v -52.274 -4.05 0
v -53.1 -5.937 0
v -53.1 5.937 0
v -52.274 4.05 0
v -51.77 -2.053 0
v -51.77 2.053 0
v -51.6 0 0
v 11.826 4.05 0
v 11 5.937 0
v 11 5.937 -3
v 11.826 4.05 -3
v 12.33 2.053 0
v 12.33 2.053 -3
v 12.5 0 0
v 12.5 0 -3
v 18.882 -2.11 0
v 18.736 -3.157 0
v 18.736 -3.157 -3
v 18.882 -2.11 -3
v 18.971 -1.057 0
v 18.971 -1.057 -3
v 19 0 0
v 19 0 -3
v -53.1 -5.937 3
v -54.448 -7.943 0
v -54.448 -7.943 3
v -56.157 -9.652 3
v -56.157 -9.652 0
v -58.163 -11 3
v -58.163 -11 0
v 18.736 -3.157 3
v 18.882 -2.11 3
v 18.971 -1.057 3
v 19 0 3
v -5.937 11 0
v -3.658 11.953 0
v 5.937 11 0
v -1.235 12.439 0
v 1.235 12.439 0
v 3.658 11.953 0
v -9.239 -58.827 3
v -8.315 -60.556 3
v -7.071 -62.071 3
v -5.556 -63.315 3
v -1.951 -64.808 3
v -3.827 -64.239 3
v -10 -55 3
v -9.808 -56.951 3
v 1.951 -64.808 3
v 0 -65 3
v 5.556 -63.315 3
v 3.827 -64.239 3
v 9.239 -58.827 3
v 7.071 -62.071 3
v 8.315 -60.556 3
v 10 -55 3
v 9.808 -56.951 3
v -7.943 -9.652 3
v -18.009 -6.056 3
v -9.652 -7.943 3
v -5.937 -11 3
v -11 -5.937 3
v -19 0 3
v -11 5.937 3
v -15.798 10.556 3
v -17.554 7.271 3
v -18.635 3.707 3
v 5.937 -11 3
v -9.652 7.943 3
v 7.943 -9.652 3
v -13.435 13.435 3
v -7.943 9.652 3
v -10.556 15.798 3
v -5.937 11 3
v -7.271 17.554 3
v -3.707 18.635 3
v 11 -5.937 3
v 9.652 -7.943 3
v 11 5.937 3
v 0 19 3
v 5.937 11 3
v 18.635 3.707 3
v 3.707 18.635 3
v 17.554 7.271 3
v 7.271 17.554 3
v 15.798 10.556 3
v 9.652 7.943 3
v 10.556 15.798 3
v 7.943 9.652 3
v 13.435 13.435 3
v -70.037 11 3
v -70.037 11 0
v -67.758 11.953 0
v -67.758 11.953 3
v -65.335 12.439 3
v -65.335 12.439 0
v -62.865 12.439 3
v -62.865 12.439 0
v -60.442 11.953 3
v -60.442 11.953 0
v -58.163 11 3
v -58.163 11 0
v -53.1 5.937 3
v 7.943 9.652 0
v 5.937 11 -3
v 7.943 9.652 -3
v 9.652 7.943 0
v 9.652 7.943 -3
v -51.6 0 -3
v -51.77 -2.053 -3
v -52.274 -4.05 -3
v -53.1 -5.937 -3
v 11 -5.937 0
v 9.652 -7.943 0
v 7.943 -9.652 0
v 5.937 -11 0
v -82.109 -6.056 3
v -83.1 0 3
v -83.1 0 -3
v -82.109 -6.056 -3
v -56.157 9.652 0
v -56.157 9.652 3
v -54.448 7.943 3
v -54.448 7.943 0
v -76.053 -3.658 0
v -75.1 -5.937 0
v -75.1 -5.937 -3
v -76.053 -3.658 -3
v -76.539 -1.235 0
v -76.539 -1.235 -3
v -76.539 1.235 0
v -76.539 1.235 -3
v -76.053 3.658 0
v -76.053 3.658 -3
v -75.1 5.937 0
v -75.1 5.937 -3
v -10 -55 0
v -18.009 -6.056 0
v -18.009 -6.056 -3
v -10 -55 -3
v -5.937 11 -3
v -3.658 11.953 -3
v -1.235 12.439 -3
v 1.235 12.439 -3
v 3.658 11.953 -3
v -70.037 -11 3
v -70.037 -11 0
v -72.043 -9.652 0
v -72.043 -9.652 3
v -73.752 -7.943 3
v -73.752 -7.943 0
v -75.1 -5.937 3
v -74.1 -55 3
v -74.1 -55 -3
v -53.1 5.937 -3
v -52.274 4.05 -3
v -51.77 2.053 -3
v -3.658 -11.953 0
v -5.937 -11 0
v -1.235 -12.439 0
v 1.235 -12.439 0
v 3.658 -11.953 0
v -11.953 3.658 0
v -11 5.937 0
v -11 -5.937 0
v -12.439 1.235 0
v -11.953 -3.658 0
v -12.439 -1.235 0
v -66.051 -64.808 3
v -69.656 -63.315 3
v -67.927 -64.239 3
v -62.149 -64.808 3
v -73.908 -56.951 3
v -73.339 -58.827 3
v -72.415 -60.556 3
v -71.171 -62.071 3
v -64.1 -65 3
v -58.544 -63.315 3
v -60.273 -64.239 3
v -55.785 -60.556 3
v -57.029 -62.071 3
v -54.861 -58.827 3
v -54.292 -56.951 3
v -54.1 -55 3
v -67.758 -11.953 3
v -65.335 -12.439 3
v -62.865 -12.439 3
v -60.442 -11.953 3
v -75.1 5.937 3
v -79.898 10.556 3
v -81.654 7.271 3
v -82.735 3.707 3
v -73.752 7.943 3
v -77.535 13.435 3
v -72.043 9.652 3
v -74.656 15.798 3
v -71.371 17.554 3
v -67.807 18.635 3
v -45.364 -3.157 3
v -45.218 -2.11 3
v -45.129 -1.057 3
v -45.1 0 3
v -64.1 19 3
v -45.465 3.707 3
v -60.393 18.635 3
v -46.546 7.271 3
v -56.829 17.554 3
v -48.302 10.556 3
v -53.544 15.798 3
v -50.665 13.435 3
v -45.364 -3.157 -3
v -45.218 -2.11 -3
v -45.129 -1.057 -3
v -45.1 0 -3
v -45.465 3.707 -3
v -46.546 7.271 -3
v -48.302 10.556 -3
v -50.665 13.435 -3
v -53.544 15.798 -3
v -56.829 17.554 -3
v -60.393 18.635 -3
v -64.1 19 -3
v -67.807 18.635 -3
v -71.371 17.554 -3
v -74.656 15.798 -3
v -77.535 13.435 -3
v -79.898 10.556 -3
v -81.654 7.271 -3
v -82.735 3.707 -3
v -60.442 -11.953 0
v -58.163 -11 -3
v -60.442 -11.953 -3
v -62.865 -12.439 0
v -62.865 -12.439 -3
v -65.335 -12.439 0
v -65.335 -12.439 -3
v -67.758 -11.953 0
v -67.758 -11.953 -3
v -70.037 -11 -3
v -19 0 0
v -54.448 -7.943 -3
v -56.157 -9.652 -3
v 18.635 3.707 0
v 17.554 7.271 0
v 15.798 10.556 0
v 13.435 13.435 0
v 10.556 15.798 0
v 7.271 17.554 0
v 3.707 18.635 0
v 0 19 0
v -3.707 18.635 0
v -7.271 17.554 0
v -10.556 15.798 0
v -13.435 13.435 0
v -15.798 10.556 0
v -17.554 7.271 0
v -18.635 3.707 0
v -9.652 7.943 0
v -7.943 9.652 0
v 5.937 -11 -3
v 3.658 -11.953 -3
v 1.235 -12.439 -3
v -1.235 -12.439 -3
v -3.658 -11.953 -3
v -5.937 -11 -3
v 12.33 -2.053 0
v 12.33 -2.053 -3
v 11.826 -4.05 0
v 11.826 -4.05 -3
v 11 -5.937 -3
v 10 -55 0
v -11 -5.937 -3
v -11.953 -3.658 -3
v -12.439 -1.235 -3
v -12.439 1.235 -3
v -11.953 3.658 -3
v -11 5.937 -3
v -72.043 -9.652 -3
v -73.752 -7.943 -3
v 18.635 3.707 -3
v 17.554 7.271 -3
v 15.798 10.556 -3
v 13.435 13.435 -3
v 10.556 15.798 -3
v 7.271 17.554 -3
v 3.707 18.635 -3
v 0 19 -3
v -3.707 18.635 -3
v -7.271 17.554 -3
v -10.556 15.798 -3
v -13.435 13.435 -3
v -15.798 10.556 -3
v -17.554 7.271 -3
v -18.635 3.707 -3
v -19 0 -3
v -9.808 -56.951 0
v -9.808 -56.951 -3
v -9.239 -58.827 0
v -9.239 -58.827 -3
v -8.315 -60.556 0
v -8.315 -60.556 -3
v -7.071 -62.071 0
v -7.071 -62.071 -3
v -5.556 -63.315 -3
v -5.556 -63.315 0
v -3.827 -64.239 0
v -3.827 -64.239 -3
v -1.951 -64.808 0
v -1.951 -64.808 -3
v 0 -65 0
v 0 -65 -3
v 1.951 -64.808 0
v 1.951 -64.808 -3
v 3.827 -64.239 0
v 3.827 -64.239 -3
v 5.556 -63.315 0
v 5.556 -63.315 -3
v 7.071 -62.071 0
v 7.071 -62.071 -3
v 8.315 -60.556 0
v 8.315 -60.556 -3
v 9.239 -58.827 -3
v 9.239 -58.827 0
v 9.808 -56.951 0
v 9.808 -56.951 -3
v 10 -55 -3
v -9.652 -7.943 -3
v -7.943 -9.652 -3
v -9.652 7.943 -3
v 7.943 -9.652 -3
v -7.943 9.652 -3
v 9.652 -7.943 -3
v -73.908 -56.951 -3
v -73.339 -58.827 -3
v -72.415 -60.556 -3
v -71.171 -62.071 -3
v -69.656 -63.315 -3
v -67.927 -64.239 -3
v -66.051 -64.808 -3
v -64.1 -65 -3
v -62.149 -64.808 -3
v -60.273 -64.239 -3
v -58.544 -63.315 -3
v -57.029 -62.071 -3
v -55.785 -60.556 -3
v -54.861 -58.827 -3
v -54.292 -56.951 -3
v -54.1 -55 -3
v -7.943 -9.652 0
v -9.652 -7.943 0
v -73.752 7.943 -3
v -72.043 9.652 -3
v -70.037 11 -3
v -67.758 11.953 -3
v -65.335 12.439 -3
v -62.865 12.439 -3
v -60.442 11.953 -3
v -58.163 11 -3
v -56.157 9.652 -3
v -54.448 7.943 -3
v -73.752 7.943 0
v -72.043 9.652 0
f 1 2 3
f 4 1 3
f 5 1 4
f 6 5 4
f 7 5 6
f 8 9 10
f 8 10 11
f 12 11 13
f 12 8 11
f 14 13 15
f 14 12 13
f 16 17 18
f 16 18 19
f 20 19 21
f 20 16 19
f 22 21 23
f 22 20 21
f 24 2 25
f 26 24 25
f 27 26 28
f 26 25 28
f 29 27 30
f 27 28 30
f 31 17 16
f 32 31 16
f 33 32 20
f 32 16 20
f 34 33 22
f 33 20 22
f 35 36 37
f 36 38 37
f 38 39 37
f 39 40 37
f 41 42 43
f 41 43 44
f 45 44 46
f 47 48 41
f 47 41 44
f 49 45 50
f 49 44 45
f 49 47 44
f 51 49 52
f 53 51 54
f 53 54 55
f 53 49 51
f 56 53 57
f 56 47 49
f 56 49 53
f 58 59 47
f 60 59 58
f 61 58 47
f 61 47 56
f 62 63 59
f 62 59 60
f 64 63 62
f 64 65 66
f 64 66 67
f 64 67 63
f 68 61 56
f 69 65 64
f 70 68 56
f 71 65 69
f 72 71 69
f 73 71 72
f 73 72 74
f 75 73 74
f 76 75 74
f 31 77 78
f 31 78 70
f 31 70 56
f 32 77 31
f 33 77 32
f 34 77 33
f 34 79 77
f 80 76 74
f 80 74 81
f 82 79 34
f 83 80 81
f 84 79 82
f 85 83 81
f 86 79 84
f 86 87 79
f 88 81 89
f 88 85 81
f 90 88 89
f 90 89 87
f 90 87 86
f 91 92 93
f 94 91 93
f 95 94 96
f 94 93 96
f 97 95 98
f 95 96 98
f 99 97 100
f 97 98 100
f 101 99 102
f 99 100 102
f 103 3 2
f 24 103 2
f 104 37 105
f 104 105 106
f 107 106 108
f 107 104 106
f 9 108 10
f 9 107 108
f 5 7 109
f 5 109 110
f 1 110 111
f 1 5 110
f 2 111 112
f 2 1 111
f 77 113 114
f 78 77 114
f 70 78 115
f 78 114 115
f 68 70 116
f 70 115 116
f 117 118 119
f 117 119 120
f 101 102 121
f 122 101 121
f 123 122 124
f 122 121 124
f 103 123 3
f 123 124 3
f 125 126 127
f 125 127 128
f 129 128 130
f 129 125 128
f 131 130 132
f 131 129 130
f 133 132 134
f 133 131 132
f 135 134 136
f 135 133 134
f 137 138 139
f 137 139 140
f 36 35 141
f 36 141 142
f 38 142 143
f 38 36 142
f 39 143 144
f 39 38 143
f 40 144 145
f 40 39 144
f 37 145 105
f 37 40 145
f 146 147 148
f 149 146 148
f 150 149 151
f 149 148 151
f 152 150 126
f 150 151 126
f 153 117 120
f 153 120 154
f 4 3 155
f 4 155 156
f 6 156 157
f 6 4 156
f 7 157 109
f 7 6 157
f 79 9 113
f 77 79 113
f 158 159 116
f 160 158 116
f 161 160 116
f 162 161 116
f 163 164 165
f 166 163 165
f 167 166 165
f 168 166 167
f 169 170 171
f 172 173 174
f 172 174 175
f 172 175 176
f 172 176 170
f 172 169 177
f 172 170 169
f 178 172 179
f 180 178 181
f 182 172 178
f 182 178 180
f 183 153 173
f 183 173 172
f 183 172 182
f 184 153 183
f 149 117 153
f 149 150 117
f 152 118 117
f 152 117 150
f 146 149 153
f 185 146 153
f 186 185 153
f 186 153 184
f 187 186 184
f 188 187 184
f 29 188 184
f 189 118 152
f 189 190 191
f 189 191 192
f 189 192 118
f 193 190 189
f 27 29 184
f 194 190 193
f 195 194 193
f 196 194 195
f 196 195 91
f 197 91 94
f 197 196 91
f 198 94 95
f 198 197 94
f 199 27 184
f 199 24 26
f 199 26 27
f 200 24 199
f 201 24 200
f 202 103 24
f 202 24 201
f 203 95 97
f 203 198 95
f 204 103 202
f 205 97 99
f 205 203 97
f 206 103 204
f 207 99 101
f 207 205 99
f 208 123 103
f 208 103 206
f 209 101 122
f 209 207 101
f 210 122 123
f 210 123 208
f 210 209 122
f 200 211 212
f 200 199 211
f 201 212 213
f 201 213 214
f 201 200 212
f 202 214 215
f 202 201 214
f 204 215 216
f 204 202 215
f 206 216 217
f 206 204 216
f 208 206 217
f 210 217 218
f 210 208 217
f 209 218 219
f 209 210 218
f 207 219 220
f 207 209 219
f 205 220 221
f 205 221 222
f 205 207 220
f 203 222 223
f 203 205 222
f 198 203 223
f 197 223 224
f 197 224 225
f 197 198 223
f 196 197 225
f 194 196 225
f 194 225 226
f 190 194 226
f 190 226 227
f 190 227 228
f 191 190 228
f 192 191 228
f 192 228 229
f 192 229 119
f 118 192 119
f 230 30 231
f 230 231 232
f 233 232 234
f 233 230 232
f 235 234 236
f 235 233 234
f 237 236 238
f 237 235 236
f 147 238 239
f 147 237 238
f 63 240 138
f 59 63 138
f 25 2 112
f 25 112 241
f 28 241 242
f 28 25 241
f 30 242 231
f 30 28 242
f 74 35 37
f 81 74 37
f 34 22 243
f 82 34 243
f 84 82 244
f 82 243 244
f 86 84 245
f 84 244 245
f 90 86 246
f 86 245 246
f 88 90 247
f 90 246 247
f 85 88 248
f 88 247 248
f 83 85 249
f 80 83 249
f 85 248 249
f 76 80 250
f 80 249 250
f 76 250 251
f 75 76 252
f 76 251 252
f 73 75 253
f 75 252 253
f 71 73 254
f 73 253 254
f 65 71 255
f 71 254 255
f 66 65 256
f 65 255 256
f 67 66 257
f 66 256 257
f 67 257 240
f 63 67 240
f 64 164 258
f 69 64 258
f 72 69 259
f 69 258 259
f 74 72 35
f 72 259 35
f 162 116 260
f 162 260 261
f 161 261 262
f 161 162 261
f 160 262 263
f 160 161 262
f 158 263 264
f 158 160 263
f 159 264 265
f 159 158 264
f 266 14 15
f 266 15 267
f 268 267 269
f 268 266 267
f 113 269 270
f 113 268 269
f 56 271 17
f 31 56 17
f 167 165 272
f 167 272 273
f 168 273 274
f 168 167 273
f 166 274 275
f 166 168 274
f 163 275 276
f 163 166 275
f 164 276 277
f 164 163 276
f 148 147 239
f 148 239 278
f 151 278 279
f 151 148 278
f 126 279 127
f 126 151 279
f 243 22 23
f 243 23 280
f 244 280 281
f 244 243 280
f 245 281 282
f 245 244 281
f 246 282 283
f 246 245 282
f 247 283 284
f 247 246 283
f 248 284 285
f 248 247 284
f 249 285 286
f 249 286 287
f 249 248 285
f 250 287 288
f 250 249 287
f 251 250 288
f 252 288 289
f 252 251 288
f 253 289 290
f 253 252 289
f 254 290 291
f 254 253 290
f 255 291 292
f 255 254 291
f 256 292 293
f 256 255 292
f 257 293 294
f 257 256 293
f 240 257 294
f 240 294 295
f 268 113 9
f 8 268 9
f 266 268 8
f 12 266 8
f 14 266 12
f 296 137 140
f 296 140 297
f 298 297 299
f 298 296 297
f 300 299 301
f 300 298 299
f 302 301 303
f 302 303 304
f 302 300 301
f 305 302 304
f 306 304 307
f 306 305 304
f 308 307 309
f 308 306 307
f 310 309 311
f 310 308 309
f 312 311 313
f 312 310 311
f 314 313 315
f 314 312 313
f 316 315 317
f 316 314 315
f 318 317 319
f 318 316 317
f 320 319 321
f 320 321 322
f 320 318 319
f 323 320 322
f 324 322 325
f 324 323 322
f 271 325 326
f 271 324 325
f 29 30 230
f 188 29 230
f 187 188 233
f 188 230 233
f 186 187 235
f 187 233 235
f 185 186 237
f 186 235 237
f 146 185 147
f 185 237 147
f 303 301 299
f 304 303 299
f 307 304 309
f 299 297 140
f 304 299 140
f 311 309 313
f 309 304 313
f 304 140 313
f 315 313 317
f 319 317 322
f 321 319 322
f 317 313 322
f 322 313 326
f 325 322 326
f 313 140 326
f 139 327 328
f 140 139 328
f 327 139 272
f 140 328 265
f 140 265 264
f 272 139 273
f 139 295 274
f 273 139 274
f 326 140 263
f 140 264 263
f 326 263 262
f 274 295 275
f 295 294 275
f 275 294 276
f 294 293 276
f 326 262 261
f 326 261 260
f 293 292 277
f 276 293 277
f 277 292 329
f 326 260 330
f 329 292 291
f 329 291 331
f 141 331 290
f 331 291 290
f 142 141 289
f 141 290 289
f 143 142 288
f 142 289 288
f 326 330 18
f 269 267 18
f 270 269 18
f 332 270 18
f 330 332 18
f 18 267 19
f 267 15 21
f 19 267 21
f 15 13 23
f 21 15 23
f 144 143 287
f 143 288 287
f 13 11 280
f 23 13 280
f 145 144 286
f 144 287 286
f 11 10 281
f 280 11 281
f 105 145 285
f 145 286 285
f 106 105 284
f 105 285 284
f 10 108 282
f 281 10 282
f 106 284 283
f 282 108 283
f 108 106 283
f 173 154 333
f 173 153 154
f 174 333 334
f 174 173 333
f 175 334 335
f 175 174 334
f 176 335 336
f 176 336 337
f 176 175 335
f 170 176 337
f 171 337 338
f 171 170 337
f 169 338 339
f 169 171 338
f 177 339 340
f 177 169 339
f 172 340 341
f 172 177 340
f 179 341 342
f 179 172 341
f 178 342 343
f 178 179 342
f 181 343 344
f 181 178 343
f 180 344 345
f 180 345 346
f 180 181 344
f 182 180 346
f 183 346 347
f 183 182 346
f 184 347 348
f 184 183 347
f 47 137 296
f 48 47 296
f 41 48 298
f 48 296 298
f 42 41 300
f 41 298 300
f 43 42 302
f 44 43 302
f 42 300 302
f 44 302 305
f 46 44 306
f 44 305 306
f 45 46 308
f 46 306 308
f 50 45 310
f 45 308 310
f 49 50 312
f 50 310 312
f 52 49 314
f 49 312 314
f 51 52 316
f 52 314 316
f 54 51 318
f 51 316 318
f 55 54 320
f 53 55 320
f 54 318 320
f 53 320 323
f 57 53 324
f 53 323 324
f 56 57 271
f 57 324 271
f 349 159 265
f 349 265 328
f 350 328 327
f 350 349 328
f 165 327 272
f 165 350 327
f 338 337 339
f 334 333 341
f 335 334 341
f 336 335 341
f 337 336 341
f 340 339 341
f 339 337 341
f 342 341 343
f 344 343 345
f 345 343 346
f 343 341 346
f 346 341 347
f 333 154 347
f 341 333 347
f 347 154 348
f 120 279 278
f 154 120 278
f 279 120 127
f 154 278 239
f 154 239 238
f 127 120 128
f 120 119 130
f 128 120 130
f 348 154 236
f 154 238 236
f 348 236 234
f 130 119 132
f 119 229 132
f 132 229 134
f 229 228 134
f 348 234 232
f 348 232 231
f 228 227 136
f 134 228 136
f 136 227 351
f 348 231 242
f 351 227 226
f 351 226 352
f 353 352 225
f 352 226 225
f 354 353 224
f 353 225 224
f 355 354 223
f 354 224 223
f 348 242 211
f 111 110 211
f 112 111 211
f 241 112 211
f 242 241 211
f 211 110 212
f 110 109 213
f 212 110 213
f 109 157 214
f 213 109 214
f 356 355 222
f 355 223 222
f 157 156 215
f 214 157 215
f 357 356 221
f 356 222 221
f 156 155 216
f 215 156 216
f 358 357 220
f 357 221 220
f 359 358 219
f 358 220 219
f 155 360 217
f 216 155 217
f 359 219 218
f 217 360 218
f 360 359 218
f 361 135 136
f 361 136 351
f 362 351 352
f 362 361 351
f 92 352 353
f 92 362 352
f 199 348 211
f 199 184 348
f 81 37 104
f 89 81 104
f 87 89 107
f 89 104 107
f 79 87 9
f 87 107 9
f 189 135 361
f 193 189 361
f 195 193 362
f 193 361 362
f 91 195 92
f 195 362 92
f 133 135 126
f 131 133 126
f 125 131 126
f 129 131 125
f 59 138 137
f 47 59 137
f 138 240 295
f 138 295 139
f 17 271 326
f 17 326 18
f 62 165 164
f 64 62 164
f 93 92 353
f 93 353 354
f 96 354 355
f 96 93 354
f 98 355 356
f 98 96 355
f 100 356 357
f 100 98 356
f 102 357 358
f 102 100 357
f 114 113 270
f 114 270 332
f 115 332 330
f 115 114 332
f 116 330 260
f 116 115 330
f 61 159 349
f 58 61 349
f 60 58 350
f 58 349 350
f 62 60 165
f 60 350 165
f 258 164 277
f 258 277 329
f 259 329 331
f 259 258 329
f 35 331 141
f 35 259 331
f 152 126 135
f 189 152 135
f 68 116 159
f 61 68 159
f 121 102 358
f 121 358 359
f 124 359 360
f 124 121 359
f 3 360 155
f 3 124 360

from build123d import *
from build123d import SkipClean  # not in build123d's __all__

# Parameters (mm, degrees)
F1_DEPTH = 3
F2_DEPTH = 3
F4_DEPTH = 25
F6_DEPTH = 25


with BuildPart() as f1:
    # F0 (on Top) → F1 (new body)
    with BuildSketch(Plane.XY):
        with BuildLine():
            ThreePointArc((18.7358645414, -3.1571157542), (18.9338509856, -1.5840728697), (19, 0))
            ThreePointArc((19, 0), (0, 19), (-19, 0))
            Line((-19, 0), (-18.00901481, -6.0560206053))
            ThreePointArc((-18.00901481, -6.0560206053), (1.4943192319, -18.9411459535), (18.7358645414, -3.1571157542))
        make_face()
        with BuildLine():
            Line((-11, 5.9371710435), (-11, 11))
            Line((-11, 11), (-5.9371710435, 11))
            ThreePointArc((-5.9371710435, 11), (0, 12.5), (5.9371710435, 11))
            Line((5.9371710435, 11), (11, 11))
            Line((11, 11), (11, 5.9371710435))
            ThreePointArc((11, 5.9371710435), (12.1191996435, 3.0618621785), (12.5, 0))
            ThreePointArc((12.5, 0), (12.1191996435, -3.0618621785), (11, -5.9371710435))
            Line((11, -5.9371710435), (11, -11))
            Line((11, -11), (5.9371710435, -11))
            ThreePointArc((5.9371710435, -11), (0, -12.5), (-5.9371710435, -11))
            Line((-5.9371710435, -11), (-11, -11))
            Line((-11, -11), (-11, -5.9371710435))
            ThreePointArc((-11, -5.9371710435), (-12.5, 0), (-11, 5.9371710435))
        make_face(mode=Mode.SUBTRACT)
        with BuildLine():
            Line((-18.00901481, -6.0560206053), (-19, 0))
            ThreePointArc((-19, 0), (-18.7506170751, -3.0682827941), (-18.00901481, -6.0560206053))
        make_face()
        with BuildLine():
            Line((10, -55), (18.7358645414, -3.1571157542))
            ThreePointArc((18.7358645414, -3.1571157542), (1.4943192319, -18.9411459535), (-18.00901481, -6.0560206053))
            Line((-18.00901481, -6.0560206053), (-10, -55))
            ThreePointArc((-10, -55), (0, -45), (10, -55))
        make_face()
        with BuildLine():
            ThreePointArc((-10, -55), (0, -65), (10, -55))
            ThreePointArc((10, -55), (0, -45), (-10, -55))
        make_face()
        with BuildLine():
            Line((-5.9371710435, 11), (-11, 11))
            Line((-11, 11), (-11, 5.9371710435))
            ThreePointArc((-11, 5.9371710435), (-8.8388347648, 8.8388347648), (-5.9371710435, 11))
        make_face()
        with BuildLine():
            ThreePointArc((5.9371710435, 11), (0, 12.5), (-5.9371710435, 11))
            Line((-5.9371710435, 11), (5.9371710435, 11))
        make_face()
        with BuildLine():
            Line((11, 11), (5.9371710435, 11))
            ThreePointArc((5.9371710435, 11), (8.8388347648, 8.8388347648), (11, 5.9371710435))
            Line((11, 5.9371710435), (11, 11))
        make_face()
        with BuildLine():
            Line((11, -11), (11, -5.9371710435))
            ThreePointArc((11, -5.9371710435), (8.8388347648, -8.8388347648), (5.9371710435, -11))
            Line((5.9371710435, -11), (11, -11))
        make_face()
        with BuildLine():
            ThreePointArc((12.5, 0), (12.1191996435, 3.0618621785), (11, 5.9371710435))
            Line((11, 5.9371710435), (11, -5.9371710435))
            ThreePointArc((11, -5.9371710435), (12.1191996435, -3.0618621785), (12.5, 0))
        make_face()
        with BuildLine():
            ThreePointArc((-5.9371710435, -11), (-8.8388347648, -8.8388347648), (-11, -5.9371710435))
            Line((-11, -5.9371710435), (-11, -11))
            Line((-11, -11), (-5.9371710435, -11))
        make_face()
        with BuildLine():
            Line((5.9371710435, -11), (-5.9371710435, -11))
            ThreePointArc((-5.9371710435, -11), (0, -12.5), (5.9371710435, -11))
        make_face()
        with BuildLine():
            Line((-11, -5.9371710435), (-11, 5.9371710435))
            ThreePointArc((-11, 5.9371710435), (-12.5, 0), (-11, -5.9371710435))
        make_face()
    extrude(amount=F1_DEPTH)

    # F0 (on Top) → F2 (join)
    with BuildSketch(Plane.XY):
        with BuildLine():
            ThreePointArc((18.7358645414, -3.1571157542), (18.9338509856, -1.5840728697), (19, 0))
            ThreePointArc((19, 0), (0, 19), (-19, 0))
            Line((-19, 0), (-18.00901481, -6.0560206053))
            ThreePointArc((-18.00901481, -6.0560206053), (1.4943192319, -18.9411459535), (18.7358645414, -3.1571157542))
        make_face()
        with BuildLine():
            Line((-11, 5.9371710435), (-11, 11))
            Line((-11, 11), (-5.9371710435, 11))
            ThreePointArc((-5.9371710435, 11), (0, 12.5), (5.9371710435, 11))
            Line((5.9371710435, 11), (11, 11))
            Line((11, 11), (11, 5.9371710435))
            ThreePointArc((11, 5.9371710435), (12.1191996435, 3.0618621785), (12.5, 0))
            ThreePointArc((12.5, 0), (12.1191996435, -3.0618621785), (11, -5.9371710435))
            Line((11, -5.9371710435), (11, -11))
            Line((11, -11), (5.9371710435, -11))
            ThreePointArc((5.9371710435, -11), (0, -12.5), (-5.9371710435, -11))
            Line((-5.9371710435, -11), (-11, -11))
            Line((-11, -11), (-11, -5.9371710435))
            ThreePointArc((-11, -5.9371710435), (-12.5, 0), (-11, 5.9371710435))
        make_face(mode=Mode.SUBTRACT)
        with BuildLine():
            Line((-5.9371710435, 11), (-11, 11))
            Line((-11, 11), (-11, 5.9371710435))
            ThreePointArc((-11, 5.9371710435), (-8.8388347648, 8.8388347648), (-5.9371710435, 11))
        make_face()
        with BuildLine():
            Line((11, 11), (5.9371710435, 11))
            ThreePointArc((5.9371710435, 11), (8.8388347648, 8.8388347648), (11, 5.9371710435))
            Line((11, 5.9371710435), (11, 11))
        make_face()
        with BuildLine():
            Line((11, -11), (11, -5.9371710435))
            ThreePointArc((11, -5.9371710435), (8.8388347648, -8.8388347648), (5.9371710435, -11))
            Line((5.9371710435, -11), (11, -11))
        make_face()
        with BuildLine():
            ThreePointArc((-5.9371710435, -11), (-8.8388347648, -8.8388347648), (-11, -5.9371710435))
            Line((-11, -5.9371710435), (-11, -11))
            Line((-11, -11), (-5.9371710435, -11))
        make_face()
        with BuildLine():
            Line((10, -55), (18.7358645414, -3.1571157542))
            ThreePointArc((18.7358645414, -3.1571157542), (1.4943192319, -18.9411459535), (-18.00901481, -6.0560206053))
            Line((-18.00901481, -6.0560206053), (-10, -55))
            ThreePointArc((-10, -55), (0, -45), (10, -55))
        make_face()
        with BuildLine():
            ThreePointArc((-10, -55), (0, -65), (10, -55))
            ThreePointArc((10, -55), (0, -45), (-10, -55))
        make_face()
    with SkipClean():  # cleaning this boolean's faces spoils the solid; the shape is the same uncleaned
        extrude(amount=-F2_DEPTH)

    # F3: union 

    # F4 (cut): a face of the model
    f4_faces = [f1.faces().sort_by_distance(p)[0] for p in [
        (-18.6030068603, -3.0441283953, 0),
    ]]
    with SkipClean():  # cleaning this boolean's faces spoils the solid; the shape is the same uncleaned
        extrude(f4_faces, amount=-F4_DEPTH, mode=Mode.SUBTRACT)


with BuildPart() as f5_1:
    # F5: copy of F1
    add(f1.part.moved(Location((-64.1, 0, 0))), clean=False)

    # F6 (cut): faces of the model
    f6_faces = [f5_1.faces().sort_by_distance(p)[0] for p in [
        (-64.1, 11.6031968432, 0),
        (-64.1, -11.6031968432, 0),
    ]]
    extrude(f6_faces, amount=-F6_DEPTH, mode=Mode.SUBTRACT)


solid = Compound([f1.part, f5_1.part])
